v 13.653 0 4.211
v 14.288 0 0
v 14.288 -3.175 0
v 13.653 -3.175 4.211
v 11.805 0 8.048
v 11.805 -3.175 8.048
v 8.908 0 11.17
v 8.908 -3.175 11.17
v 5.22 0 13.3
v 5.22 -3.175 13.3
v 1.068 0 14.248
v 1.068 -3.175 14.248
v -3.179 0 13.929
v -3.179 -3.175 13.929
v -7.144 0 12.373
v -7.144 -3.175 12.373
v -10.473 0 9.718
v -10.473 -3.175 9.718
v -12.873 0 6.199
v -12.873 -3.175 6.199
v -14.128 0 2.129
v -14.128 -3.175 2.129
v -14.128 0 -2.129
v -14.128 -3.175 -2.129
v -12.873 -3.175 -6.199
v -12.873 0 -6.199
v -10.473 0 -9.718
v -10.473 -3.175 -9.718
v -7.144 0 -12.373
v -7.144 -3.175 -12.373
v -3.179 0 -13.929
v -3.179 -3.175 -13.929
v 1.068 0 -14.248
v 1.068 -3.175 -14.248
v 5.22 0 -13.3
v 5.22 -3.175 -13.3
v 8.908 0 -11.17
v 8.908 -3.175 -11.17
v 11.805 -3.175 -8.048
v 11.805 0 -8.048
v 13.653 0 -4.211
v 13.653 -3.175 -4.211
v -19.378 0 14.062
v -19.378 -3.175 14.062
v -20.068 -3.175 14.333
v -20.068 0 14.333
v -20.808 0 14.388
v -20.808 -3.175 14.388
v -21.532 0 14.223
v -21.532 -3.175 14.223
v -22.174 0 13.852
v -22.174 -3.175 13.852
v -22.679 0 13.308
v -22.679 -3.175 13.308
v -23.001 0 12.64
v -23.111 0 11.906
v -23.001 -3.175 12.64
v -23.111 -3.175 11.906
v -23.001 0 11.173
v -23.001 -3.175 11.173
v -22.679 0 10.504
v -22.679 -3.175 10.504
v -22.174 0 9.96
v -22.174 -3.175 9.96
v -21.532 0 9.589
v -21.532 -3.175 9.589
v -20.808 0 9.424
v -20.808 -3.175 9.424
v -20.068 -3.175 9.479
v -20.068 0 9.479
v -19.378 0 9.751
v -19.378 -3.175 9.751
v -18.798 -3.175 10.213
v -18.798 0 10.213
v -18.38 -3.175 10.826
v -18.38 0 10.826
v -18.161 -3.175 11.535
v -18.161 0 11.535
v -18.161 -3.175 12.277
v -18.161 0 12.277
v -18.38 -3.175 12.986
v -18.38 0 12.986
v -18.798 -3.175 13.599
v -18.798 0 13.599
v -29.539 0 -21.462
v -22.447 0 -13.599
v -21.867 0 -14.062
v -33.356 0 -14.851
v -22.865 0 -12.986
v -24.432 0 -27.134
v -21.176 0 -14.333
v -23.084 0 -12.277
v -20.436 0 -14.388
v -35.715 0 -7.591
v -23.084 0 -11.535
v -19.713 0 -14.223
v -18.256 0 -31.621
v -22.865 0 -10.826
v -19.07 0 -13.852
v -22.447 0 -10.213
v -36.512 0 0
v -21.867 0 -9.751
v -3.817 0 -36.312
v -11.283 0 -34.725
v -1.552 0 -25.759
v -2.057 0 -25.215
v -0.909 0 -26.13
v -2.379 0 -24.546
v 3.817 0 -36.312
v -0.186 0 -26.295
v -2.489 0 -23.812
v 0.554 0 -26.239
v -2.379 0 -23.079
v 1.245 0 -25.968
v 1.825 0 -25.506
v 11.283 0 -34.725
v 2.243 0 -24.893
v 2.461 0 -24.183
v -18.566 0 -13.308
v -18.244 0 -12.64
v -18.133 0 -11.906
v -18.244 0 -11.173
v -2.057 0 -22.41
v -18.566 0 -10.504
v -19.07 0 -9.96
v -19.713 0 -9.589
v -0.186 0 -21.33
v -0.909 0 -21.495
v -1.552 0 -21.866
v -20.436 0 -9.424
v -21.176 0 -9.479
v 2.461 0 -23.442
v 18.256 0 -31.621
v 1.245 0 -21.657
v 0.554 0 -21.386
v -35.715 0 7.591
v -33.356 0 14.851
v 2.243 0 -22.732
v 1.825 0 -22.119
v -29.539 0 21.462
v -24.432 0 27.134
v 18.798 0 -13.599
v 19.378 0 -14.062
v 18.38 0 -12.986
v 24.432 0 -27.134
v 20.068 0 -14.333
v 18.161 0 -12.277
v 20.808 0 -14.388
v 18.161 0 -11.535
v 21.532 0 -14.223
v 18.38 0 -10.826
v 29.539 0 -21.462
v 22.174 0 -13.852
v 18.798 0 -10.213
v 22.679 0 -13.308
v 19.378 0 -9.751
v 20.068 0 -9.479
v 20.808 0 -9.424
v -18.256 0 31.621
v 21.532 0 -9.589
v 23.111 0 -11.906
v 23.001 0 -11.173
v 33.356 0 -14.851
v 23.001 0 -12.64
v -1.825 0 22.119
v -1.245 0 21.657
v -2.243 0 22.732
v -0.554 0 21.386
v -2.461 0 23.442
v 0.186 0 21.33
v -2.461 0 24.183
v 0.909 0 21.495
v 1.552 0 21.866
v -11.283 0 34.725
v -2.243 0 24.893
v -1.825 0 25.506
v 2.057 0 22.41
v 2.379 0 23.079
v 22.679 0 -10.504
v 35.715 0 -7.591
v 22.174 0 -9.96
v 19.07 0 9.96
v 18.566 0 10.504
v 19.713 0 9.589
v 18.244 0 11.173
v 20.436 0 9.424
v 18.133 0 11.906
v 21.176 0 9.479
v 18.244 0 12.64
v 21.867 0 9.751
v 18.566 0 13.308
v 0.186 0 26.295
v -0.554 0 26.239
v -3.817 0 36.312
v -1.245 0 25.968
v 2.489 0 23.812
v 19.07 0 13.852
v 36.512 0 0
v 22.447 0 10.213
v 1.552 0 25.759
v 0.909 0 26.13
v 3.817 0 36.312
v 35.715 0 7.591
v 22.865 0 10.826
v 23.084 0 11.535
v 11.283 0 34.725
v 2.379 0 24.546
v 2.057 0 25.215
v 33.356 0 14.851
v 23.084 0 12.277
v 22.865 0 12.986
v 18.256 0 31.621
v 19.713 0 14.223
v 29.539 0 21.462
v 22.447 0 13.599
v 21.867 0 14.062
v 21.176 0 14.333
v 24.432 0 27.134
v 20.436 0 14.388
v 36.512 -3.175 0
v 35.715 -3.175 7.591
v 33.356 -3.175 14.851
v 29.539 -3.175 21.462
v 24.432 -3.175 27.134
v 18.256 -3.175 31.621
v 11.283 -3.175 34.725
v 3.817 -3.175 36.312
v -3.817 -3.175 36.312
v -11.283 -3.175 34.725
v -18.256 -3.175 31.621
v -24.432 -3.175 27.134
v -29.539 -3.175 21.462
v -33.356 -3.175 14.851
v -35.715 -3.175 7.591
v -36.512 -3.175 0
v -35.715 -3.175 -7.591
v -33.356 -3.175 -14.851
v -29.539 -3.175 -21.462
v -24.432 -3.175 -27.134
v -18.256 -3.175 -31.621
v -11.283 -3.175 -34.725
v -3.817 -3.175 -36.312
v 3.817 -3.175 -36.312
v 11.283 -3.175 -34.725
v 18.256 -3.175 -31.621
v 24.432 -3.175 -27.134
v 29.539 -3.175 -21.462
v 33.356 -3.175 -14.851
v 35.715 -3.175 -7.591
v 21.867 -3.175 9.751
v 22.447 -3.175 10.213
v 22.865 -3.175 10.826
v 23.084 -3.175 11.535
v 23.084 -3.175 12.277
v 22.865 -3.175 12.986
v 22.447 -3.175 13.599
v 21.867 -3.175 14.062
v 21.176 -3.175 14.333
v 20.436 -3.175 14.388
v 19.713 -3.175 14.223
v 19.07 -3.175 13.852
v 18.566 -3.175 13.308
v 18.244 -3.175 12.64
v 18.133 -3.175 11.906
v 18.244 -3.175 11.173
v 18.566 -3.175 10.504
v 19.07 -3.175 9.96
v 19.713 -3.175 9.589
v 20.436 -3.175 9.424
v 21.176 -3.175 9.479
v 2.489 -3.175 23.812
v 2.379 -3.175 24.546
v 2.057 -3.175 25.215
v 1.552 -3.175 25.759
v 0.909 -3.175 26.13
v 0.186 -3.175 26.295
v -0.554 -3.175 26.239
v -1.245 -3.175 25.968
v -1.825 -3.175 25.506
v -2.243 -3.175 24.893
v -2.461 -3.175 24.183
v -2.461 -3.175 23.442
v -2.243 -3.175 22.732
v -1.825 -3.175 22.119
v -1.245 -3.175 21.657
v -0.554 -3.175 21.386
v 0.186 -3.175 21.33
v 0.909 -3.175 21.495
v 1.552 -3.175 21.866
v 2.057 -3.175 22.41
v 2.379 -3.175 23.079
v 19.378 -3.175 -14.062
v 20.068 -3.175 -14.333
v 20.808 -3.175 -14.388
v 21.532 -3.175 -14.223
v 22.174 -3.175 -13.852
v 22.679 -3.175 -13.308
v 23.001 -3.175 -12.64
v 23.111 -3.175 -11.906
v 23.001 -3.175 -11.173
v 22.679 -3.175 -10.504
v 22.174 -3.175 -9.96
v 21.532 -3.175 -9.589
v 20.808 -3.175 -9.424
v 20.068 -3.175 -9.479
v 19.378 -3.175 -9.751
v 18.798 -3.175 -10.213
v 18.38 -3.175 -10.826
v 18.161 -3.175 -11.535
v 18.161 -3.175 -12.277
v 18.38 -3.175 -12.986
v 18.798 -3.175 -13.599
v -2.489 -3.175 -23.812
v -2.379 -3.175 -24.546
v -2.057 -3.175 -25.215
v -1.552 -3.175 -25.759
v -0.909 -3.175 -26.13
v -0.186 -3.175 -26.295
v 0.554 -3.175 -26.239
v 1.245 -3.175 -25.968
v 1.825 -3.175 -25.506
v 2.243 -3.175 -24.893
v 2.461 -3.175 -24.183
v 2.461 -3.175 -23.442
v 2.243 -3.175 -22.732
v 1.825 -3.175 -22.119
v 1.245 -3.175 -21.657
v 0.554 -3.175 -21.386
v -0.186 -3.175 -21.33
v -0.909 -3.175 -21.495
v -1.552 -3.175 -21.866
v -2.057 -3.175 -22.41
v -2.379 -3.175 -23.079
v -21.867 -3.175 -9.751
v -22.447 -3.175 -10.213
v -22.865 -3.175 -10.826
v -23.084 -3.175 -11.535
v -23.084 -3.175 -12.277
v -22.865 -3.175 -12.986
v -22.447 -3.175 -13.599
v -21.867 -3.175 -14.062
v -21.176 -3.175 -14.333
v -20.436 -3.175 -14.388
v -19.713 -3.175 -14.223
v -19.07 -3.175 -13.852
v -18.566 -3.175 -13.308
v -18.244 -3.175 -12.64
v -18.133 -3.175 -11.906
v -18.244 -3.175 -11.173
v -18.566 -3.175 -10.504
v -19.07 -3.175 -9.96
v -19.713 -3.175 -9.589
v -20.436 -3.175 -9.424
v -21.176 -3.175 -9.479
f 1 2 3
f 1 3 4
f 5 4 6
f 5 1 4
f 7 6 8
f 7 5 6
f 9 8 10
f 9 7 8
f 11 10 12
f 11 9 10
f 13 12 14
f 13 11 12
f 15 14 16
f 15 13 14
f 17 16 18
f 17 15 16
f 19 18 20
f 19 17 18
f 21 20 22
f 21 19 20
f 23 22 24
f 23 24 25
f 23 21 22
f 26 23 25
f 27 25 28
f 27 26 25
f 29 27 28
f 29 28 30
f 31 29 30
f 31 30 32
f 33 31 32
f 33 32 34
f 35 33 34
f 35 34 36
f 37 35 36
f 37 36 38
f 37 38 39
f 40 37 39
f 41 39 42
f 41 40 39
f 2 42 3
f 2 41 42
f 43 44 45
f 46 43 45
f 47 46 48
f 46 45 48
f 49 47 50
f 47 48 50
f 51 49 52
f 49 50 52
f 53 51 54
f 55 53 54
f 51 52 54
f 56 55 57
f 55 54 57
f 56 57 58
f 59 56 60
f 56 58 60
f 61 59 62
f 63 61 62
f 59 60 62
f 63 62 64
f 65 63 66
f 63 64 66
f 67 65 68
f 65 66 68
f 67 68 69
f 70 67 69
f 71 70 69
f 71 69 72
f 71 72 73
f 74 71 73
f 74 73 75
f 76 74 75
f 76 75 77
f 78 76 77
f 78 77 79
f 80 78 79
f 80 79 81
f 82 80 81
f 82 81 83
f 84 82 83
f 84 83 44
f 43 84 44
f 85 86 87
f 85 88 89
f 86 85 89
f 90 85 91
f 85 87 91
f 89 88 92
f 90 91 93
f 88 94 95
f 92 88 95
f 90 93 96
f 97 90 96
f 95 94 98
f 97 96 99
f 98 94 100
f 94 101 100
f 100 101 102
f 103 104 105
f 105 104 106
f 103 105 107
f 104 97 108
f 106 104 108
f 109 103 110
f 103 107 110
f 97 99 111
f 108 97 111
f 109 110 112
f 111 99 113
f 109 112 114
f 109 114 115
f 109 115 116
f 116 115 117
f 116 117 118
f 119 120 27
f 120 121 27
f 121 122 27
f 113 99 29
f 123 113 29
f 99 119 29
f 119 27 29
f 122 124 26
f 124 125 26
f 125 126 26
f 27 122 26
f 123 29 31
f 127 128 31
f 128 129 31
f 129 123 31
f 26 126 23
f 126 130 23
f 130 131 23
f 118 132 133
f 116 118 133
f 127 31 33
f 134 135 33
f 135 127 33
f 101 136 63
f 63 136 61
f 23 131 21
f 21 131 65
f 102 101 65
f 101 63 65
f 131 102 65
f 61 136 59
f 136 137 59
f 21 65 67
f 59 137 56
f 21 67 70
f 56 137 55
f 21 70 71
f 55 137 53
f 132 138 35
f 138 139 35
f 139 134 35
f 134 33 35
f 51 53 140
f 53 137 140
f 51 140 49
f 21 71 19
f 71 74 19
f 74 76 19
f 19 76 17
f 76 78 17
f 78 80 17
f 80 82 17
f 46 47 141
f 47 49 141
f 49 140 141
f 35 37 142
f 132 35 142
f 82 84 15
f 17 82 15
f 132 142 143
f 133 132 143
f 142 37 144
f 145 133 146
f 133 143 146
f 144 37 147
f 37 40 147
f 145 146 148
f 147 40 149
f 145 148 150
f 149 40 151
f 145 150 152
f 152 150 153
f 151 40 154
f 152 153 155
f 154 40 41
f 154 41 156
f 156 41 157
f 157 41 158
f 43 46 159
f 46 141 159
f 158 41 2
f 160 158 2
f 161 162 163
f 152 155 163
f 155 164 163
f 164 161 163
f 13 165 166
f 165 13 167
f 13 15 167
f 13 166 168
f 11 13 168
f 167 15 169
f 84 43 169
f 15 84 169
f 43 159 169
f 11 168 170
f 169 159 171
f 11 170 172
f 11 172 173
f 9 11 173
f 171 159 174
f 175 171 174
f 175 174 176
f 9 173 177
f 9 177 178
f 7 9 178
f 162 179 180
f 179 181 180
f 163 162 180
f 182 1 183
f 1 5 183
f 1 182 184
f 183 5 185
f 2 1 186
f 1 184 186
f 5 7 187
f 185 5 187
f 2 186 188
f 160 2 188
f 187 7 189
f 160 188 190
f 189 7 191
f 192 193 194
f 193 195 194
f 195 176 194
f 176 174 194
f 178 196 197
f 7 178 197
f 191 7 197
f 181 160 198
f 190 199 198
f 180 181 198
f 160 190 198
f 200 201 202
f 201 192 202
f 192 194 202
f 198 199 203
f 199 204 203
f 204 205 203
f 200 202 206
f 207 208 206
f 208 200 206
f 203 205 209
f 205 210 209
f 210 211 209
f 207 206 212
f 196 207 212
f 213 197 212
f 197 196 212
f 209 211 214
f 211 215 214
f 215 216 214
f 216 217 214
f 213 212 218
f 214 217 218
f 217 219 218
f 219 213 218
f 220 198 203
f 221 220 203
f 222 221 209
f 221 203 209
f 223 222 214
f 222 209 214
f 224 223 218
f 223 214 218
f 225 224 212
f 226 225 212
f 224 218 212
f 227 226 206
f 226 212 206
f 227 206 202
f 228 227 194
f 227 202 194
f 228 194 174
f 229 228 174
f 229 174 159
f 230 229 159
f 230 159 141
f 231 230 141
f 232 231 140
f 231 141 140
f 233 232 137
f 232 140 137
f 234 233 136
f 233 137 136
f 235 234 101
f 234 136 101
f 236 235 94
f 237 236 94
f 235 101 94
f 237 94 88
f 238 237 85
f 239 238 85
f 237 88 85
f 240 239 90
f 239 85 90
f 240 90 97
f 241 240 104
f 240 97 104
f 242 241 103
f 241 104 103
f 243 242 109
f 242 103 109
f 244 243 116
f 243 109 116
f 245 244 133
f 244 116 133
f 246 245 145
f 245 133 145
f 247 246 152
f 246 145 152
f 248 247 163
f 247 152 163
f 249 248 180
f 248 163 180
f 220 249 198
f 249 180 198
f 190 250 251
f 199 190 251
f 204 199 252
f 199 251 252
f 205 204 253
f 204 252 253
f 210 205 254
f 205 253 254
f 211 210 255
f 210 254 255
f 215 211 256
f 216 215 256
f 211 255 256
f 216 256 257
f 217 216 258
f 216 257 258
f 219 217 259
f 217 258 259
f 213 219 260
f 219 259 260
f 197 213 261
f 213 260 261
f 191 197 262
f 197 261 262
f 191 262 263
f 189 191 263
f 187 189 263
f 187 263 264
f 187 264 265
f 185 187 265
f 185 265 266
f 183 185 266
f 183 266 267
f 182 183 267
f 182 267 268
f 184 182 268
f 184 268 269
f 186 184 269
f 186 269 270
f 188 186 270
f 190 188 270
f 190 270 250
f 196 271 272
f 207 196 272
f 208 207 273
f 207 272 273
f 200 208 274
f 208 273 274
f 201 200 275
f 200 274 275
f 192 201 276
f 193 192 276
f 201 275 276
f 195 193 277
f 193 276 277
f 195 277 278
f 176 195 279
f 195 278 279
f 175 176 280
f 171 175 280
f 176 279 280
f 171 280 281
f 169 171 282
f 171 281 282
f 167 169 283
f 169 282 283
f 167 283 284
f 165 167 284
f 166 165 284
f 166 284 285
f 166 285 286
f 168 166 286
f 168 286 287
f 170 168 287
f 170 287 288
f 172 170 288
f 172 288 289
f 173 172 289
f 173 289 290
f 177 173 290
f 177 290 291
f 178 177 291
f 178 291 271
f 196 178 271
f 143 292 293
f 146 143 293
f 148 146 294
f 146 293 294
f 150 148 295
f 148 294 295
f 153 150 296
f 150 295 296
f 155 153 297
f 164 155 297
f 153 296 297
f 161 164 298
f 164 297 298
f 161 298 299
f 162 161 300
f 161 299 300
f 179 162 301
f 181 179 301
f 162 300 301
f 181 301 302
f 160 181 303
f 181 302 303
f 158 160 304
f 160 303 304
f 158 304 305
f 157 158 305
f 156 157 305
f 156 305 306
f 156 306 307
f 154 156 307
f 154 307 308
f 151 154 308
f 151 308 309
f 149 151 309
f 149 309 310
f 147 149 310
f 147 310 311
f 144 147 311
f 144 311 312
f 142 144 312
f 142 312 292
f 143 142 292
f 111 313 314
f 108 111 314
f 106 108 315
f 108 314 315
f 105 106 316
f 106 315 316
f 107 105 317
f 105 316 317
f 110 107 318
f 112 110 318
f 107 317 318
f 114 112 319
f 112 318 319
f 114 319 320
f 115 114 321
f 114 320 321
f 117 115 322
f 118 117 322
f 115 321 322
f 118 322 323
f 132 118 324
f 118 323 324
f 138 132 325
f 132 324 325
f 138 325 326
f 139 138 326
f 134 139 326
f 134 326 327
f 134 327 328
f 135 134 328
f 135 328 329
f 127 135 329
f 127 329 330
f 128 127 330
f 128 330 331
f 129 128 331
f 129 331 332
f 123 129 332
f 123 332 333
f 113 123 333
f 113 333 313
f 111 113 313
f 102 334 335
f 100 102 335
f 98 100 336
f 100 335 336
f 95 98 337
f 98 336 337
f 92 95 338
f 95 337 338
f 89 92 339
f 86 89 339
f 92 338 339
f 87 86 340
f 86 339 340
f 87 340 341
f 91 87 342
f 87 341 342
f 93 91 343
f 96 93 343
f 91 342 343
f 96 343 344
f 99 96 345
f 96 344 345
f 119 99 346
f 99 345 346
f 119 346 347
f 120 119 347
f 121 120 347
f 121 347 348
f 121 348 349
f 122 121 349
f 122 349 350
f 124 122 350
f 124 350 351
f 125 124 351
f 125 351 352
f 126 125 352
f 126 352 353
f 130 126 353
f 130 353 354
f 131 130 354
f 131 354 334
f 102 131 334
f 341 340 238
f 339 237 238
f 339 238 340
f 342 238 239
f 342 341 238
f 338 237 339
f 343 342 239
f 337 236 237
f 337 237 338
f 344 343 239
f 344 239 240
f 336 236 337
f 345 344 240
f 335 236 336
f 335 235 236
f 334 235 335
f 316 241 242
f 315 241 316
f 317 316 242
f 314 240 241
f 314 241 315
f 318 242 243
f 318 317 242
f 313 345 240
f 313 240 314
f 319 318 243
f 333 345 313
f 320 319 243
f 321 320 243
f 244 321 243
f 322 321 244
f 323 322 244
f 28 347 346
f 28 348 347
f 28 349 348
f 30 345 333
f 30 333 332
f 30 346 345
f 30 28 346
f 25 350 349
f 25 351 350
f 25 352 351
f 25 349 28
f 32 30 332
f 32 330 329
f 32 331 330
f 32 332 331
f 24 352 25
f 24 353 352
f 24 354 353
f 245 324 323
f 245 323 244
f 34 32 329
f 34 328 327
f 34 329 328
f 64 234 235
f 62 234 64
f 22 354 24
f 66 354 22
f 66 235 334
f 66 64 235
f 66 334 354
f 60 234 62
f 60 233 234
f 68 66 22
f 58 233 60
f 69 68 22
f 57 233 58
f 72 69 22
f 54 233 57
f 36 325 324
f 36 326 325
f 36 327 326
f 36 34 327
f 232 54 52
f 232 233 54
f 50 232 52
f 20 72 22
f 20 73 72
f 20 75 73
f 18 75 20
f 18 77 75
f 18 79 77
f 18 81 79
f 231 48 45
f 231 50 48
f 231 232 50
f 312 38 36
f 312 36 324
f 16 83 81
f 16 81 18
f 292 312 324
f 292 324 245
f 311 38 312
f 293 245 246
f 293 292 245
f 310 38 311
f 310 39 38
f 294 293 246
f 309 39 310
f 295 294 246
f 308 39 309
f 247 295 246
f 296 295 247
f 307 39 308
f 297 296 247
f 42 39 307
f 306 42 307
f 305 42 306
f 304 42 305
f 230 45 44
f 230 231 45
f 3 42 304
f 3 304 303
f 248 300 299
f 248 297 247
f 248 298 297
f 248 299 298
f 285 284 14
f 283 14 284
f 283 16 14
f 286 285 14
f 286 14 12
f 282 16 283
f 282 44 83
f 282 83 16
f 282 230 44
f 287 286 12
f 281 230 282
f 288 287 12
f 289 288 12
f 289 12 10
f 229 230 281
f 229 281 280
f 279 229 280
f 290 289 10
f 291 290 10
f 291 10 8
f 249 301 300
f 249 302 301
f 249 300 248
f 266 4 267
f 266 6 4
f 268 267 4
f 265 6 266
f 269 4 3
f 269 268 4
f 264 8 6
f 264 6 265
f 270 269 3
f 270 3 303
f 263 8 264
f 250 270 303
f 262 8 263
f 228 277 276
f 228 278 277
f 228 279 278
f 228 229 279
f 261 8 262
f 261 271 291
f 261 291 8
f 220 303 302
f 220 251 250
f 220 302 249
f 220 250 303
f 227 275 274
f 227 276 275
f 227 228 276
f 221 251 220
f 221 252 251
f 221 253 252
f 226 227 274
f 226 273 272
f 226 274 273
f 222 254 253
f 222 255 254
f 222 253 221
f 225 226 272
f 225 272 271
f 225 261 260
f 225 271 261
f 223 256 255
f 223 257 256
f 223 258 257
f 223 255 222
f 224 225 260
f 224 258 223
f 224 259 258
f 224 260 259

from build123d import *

# Parameters (mm, degrees)
F0_R            = 36.5125
F0_R_2          = 14.2875
F1_DEPTH        = 3.175
F2_R            = 2.4892
F3_DEPTH        = 3.176
F3_COPIES_COUNT = 6


# Not quite as in the source:
# - a pattern or mirror of a feature is missing from the dataset's text; its kind, count and spacing are read off the source's solid


with BuildPart() as f1:
    # F0 (on Front) → F1 (new body)
    with BuildSketch(Plane.XZ):
        Circle(F0_R)
        Circle(F0_R_2, mode=Mode.SUBTRACT)
    extrude(amount=F1_DEPTH)

    # F2 (on face) → F3 (cut, through all)
    with BuildSketch(Plane.XZ.offset(3.175)):
        with Locations((0, 23.8125)):
            Circle(F2_R)
    f3 = extrude(amount=-F3_DEPTH, mode=Mode.SUBTRACT)

    # F3_copies: F3 ×6 about axis
    f3_copies_axis = Axis((0, 0, 0), (0, 1, 0))
    for i in range(1, F3_COPIES_COUNT):
        add(f3.rotate(f3_copies_axis, i * 360 / F3_COPIES_COUNT), mode=Mode.SUBTRACT)


solid = f1.part
